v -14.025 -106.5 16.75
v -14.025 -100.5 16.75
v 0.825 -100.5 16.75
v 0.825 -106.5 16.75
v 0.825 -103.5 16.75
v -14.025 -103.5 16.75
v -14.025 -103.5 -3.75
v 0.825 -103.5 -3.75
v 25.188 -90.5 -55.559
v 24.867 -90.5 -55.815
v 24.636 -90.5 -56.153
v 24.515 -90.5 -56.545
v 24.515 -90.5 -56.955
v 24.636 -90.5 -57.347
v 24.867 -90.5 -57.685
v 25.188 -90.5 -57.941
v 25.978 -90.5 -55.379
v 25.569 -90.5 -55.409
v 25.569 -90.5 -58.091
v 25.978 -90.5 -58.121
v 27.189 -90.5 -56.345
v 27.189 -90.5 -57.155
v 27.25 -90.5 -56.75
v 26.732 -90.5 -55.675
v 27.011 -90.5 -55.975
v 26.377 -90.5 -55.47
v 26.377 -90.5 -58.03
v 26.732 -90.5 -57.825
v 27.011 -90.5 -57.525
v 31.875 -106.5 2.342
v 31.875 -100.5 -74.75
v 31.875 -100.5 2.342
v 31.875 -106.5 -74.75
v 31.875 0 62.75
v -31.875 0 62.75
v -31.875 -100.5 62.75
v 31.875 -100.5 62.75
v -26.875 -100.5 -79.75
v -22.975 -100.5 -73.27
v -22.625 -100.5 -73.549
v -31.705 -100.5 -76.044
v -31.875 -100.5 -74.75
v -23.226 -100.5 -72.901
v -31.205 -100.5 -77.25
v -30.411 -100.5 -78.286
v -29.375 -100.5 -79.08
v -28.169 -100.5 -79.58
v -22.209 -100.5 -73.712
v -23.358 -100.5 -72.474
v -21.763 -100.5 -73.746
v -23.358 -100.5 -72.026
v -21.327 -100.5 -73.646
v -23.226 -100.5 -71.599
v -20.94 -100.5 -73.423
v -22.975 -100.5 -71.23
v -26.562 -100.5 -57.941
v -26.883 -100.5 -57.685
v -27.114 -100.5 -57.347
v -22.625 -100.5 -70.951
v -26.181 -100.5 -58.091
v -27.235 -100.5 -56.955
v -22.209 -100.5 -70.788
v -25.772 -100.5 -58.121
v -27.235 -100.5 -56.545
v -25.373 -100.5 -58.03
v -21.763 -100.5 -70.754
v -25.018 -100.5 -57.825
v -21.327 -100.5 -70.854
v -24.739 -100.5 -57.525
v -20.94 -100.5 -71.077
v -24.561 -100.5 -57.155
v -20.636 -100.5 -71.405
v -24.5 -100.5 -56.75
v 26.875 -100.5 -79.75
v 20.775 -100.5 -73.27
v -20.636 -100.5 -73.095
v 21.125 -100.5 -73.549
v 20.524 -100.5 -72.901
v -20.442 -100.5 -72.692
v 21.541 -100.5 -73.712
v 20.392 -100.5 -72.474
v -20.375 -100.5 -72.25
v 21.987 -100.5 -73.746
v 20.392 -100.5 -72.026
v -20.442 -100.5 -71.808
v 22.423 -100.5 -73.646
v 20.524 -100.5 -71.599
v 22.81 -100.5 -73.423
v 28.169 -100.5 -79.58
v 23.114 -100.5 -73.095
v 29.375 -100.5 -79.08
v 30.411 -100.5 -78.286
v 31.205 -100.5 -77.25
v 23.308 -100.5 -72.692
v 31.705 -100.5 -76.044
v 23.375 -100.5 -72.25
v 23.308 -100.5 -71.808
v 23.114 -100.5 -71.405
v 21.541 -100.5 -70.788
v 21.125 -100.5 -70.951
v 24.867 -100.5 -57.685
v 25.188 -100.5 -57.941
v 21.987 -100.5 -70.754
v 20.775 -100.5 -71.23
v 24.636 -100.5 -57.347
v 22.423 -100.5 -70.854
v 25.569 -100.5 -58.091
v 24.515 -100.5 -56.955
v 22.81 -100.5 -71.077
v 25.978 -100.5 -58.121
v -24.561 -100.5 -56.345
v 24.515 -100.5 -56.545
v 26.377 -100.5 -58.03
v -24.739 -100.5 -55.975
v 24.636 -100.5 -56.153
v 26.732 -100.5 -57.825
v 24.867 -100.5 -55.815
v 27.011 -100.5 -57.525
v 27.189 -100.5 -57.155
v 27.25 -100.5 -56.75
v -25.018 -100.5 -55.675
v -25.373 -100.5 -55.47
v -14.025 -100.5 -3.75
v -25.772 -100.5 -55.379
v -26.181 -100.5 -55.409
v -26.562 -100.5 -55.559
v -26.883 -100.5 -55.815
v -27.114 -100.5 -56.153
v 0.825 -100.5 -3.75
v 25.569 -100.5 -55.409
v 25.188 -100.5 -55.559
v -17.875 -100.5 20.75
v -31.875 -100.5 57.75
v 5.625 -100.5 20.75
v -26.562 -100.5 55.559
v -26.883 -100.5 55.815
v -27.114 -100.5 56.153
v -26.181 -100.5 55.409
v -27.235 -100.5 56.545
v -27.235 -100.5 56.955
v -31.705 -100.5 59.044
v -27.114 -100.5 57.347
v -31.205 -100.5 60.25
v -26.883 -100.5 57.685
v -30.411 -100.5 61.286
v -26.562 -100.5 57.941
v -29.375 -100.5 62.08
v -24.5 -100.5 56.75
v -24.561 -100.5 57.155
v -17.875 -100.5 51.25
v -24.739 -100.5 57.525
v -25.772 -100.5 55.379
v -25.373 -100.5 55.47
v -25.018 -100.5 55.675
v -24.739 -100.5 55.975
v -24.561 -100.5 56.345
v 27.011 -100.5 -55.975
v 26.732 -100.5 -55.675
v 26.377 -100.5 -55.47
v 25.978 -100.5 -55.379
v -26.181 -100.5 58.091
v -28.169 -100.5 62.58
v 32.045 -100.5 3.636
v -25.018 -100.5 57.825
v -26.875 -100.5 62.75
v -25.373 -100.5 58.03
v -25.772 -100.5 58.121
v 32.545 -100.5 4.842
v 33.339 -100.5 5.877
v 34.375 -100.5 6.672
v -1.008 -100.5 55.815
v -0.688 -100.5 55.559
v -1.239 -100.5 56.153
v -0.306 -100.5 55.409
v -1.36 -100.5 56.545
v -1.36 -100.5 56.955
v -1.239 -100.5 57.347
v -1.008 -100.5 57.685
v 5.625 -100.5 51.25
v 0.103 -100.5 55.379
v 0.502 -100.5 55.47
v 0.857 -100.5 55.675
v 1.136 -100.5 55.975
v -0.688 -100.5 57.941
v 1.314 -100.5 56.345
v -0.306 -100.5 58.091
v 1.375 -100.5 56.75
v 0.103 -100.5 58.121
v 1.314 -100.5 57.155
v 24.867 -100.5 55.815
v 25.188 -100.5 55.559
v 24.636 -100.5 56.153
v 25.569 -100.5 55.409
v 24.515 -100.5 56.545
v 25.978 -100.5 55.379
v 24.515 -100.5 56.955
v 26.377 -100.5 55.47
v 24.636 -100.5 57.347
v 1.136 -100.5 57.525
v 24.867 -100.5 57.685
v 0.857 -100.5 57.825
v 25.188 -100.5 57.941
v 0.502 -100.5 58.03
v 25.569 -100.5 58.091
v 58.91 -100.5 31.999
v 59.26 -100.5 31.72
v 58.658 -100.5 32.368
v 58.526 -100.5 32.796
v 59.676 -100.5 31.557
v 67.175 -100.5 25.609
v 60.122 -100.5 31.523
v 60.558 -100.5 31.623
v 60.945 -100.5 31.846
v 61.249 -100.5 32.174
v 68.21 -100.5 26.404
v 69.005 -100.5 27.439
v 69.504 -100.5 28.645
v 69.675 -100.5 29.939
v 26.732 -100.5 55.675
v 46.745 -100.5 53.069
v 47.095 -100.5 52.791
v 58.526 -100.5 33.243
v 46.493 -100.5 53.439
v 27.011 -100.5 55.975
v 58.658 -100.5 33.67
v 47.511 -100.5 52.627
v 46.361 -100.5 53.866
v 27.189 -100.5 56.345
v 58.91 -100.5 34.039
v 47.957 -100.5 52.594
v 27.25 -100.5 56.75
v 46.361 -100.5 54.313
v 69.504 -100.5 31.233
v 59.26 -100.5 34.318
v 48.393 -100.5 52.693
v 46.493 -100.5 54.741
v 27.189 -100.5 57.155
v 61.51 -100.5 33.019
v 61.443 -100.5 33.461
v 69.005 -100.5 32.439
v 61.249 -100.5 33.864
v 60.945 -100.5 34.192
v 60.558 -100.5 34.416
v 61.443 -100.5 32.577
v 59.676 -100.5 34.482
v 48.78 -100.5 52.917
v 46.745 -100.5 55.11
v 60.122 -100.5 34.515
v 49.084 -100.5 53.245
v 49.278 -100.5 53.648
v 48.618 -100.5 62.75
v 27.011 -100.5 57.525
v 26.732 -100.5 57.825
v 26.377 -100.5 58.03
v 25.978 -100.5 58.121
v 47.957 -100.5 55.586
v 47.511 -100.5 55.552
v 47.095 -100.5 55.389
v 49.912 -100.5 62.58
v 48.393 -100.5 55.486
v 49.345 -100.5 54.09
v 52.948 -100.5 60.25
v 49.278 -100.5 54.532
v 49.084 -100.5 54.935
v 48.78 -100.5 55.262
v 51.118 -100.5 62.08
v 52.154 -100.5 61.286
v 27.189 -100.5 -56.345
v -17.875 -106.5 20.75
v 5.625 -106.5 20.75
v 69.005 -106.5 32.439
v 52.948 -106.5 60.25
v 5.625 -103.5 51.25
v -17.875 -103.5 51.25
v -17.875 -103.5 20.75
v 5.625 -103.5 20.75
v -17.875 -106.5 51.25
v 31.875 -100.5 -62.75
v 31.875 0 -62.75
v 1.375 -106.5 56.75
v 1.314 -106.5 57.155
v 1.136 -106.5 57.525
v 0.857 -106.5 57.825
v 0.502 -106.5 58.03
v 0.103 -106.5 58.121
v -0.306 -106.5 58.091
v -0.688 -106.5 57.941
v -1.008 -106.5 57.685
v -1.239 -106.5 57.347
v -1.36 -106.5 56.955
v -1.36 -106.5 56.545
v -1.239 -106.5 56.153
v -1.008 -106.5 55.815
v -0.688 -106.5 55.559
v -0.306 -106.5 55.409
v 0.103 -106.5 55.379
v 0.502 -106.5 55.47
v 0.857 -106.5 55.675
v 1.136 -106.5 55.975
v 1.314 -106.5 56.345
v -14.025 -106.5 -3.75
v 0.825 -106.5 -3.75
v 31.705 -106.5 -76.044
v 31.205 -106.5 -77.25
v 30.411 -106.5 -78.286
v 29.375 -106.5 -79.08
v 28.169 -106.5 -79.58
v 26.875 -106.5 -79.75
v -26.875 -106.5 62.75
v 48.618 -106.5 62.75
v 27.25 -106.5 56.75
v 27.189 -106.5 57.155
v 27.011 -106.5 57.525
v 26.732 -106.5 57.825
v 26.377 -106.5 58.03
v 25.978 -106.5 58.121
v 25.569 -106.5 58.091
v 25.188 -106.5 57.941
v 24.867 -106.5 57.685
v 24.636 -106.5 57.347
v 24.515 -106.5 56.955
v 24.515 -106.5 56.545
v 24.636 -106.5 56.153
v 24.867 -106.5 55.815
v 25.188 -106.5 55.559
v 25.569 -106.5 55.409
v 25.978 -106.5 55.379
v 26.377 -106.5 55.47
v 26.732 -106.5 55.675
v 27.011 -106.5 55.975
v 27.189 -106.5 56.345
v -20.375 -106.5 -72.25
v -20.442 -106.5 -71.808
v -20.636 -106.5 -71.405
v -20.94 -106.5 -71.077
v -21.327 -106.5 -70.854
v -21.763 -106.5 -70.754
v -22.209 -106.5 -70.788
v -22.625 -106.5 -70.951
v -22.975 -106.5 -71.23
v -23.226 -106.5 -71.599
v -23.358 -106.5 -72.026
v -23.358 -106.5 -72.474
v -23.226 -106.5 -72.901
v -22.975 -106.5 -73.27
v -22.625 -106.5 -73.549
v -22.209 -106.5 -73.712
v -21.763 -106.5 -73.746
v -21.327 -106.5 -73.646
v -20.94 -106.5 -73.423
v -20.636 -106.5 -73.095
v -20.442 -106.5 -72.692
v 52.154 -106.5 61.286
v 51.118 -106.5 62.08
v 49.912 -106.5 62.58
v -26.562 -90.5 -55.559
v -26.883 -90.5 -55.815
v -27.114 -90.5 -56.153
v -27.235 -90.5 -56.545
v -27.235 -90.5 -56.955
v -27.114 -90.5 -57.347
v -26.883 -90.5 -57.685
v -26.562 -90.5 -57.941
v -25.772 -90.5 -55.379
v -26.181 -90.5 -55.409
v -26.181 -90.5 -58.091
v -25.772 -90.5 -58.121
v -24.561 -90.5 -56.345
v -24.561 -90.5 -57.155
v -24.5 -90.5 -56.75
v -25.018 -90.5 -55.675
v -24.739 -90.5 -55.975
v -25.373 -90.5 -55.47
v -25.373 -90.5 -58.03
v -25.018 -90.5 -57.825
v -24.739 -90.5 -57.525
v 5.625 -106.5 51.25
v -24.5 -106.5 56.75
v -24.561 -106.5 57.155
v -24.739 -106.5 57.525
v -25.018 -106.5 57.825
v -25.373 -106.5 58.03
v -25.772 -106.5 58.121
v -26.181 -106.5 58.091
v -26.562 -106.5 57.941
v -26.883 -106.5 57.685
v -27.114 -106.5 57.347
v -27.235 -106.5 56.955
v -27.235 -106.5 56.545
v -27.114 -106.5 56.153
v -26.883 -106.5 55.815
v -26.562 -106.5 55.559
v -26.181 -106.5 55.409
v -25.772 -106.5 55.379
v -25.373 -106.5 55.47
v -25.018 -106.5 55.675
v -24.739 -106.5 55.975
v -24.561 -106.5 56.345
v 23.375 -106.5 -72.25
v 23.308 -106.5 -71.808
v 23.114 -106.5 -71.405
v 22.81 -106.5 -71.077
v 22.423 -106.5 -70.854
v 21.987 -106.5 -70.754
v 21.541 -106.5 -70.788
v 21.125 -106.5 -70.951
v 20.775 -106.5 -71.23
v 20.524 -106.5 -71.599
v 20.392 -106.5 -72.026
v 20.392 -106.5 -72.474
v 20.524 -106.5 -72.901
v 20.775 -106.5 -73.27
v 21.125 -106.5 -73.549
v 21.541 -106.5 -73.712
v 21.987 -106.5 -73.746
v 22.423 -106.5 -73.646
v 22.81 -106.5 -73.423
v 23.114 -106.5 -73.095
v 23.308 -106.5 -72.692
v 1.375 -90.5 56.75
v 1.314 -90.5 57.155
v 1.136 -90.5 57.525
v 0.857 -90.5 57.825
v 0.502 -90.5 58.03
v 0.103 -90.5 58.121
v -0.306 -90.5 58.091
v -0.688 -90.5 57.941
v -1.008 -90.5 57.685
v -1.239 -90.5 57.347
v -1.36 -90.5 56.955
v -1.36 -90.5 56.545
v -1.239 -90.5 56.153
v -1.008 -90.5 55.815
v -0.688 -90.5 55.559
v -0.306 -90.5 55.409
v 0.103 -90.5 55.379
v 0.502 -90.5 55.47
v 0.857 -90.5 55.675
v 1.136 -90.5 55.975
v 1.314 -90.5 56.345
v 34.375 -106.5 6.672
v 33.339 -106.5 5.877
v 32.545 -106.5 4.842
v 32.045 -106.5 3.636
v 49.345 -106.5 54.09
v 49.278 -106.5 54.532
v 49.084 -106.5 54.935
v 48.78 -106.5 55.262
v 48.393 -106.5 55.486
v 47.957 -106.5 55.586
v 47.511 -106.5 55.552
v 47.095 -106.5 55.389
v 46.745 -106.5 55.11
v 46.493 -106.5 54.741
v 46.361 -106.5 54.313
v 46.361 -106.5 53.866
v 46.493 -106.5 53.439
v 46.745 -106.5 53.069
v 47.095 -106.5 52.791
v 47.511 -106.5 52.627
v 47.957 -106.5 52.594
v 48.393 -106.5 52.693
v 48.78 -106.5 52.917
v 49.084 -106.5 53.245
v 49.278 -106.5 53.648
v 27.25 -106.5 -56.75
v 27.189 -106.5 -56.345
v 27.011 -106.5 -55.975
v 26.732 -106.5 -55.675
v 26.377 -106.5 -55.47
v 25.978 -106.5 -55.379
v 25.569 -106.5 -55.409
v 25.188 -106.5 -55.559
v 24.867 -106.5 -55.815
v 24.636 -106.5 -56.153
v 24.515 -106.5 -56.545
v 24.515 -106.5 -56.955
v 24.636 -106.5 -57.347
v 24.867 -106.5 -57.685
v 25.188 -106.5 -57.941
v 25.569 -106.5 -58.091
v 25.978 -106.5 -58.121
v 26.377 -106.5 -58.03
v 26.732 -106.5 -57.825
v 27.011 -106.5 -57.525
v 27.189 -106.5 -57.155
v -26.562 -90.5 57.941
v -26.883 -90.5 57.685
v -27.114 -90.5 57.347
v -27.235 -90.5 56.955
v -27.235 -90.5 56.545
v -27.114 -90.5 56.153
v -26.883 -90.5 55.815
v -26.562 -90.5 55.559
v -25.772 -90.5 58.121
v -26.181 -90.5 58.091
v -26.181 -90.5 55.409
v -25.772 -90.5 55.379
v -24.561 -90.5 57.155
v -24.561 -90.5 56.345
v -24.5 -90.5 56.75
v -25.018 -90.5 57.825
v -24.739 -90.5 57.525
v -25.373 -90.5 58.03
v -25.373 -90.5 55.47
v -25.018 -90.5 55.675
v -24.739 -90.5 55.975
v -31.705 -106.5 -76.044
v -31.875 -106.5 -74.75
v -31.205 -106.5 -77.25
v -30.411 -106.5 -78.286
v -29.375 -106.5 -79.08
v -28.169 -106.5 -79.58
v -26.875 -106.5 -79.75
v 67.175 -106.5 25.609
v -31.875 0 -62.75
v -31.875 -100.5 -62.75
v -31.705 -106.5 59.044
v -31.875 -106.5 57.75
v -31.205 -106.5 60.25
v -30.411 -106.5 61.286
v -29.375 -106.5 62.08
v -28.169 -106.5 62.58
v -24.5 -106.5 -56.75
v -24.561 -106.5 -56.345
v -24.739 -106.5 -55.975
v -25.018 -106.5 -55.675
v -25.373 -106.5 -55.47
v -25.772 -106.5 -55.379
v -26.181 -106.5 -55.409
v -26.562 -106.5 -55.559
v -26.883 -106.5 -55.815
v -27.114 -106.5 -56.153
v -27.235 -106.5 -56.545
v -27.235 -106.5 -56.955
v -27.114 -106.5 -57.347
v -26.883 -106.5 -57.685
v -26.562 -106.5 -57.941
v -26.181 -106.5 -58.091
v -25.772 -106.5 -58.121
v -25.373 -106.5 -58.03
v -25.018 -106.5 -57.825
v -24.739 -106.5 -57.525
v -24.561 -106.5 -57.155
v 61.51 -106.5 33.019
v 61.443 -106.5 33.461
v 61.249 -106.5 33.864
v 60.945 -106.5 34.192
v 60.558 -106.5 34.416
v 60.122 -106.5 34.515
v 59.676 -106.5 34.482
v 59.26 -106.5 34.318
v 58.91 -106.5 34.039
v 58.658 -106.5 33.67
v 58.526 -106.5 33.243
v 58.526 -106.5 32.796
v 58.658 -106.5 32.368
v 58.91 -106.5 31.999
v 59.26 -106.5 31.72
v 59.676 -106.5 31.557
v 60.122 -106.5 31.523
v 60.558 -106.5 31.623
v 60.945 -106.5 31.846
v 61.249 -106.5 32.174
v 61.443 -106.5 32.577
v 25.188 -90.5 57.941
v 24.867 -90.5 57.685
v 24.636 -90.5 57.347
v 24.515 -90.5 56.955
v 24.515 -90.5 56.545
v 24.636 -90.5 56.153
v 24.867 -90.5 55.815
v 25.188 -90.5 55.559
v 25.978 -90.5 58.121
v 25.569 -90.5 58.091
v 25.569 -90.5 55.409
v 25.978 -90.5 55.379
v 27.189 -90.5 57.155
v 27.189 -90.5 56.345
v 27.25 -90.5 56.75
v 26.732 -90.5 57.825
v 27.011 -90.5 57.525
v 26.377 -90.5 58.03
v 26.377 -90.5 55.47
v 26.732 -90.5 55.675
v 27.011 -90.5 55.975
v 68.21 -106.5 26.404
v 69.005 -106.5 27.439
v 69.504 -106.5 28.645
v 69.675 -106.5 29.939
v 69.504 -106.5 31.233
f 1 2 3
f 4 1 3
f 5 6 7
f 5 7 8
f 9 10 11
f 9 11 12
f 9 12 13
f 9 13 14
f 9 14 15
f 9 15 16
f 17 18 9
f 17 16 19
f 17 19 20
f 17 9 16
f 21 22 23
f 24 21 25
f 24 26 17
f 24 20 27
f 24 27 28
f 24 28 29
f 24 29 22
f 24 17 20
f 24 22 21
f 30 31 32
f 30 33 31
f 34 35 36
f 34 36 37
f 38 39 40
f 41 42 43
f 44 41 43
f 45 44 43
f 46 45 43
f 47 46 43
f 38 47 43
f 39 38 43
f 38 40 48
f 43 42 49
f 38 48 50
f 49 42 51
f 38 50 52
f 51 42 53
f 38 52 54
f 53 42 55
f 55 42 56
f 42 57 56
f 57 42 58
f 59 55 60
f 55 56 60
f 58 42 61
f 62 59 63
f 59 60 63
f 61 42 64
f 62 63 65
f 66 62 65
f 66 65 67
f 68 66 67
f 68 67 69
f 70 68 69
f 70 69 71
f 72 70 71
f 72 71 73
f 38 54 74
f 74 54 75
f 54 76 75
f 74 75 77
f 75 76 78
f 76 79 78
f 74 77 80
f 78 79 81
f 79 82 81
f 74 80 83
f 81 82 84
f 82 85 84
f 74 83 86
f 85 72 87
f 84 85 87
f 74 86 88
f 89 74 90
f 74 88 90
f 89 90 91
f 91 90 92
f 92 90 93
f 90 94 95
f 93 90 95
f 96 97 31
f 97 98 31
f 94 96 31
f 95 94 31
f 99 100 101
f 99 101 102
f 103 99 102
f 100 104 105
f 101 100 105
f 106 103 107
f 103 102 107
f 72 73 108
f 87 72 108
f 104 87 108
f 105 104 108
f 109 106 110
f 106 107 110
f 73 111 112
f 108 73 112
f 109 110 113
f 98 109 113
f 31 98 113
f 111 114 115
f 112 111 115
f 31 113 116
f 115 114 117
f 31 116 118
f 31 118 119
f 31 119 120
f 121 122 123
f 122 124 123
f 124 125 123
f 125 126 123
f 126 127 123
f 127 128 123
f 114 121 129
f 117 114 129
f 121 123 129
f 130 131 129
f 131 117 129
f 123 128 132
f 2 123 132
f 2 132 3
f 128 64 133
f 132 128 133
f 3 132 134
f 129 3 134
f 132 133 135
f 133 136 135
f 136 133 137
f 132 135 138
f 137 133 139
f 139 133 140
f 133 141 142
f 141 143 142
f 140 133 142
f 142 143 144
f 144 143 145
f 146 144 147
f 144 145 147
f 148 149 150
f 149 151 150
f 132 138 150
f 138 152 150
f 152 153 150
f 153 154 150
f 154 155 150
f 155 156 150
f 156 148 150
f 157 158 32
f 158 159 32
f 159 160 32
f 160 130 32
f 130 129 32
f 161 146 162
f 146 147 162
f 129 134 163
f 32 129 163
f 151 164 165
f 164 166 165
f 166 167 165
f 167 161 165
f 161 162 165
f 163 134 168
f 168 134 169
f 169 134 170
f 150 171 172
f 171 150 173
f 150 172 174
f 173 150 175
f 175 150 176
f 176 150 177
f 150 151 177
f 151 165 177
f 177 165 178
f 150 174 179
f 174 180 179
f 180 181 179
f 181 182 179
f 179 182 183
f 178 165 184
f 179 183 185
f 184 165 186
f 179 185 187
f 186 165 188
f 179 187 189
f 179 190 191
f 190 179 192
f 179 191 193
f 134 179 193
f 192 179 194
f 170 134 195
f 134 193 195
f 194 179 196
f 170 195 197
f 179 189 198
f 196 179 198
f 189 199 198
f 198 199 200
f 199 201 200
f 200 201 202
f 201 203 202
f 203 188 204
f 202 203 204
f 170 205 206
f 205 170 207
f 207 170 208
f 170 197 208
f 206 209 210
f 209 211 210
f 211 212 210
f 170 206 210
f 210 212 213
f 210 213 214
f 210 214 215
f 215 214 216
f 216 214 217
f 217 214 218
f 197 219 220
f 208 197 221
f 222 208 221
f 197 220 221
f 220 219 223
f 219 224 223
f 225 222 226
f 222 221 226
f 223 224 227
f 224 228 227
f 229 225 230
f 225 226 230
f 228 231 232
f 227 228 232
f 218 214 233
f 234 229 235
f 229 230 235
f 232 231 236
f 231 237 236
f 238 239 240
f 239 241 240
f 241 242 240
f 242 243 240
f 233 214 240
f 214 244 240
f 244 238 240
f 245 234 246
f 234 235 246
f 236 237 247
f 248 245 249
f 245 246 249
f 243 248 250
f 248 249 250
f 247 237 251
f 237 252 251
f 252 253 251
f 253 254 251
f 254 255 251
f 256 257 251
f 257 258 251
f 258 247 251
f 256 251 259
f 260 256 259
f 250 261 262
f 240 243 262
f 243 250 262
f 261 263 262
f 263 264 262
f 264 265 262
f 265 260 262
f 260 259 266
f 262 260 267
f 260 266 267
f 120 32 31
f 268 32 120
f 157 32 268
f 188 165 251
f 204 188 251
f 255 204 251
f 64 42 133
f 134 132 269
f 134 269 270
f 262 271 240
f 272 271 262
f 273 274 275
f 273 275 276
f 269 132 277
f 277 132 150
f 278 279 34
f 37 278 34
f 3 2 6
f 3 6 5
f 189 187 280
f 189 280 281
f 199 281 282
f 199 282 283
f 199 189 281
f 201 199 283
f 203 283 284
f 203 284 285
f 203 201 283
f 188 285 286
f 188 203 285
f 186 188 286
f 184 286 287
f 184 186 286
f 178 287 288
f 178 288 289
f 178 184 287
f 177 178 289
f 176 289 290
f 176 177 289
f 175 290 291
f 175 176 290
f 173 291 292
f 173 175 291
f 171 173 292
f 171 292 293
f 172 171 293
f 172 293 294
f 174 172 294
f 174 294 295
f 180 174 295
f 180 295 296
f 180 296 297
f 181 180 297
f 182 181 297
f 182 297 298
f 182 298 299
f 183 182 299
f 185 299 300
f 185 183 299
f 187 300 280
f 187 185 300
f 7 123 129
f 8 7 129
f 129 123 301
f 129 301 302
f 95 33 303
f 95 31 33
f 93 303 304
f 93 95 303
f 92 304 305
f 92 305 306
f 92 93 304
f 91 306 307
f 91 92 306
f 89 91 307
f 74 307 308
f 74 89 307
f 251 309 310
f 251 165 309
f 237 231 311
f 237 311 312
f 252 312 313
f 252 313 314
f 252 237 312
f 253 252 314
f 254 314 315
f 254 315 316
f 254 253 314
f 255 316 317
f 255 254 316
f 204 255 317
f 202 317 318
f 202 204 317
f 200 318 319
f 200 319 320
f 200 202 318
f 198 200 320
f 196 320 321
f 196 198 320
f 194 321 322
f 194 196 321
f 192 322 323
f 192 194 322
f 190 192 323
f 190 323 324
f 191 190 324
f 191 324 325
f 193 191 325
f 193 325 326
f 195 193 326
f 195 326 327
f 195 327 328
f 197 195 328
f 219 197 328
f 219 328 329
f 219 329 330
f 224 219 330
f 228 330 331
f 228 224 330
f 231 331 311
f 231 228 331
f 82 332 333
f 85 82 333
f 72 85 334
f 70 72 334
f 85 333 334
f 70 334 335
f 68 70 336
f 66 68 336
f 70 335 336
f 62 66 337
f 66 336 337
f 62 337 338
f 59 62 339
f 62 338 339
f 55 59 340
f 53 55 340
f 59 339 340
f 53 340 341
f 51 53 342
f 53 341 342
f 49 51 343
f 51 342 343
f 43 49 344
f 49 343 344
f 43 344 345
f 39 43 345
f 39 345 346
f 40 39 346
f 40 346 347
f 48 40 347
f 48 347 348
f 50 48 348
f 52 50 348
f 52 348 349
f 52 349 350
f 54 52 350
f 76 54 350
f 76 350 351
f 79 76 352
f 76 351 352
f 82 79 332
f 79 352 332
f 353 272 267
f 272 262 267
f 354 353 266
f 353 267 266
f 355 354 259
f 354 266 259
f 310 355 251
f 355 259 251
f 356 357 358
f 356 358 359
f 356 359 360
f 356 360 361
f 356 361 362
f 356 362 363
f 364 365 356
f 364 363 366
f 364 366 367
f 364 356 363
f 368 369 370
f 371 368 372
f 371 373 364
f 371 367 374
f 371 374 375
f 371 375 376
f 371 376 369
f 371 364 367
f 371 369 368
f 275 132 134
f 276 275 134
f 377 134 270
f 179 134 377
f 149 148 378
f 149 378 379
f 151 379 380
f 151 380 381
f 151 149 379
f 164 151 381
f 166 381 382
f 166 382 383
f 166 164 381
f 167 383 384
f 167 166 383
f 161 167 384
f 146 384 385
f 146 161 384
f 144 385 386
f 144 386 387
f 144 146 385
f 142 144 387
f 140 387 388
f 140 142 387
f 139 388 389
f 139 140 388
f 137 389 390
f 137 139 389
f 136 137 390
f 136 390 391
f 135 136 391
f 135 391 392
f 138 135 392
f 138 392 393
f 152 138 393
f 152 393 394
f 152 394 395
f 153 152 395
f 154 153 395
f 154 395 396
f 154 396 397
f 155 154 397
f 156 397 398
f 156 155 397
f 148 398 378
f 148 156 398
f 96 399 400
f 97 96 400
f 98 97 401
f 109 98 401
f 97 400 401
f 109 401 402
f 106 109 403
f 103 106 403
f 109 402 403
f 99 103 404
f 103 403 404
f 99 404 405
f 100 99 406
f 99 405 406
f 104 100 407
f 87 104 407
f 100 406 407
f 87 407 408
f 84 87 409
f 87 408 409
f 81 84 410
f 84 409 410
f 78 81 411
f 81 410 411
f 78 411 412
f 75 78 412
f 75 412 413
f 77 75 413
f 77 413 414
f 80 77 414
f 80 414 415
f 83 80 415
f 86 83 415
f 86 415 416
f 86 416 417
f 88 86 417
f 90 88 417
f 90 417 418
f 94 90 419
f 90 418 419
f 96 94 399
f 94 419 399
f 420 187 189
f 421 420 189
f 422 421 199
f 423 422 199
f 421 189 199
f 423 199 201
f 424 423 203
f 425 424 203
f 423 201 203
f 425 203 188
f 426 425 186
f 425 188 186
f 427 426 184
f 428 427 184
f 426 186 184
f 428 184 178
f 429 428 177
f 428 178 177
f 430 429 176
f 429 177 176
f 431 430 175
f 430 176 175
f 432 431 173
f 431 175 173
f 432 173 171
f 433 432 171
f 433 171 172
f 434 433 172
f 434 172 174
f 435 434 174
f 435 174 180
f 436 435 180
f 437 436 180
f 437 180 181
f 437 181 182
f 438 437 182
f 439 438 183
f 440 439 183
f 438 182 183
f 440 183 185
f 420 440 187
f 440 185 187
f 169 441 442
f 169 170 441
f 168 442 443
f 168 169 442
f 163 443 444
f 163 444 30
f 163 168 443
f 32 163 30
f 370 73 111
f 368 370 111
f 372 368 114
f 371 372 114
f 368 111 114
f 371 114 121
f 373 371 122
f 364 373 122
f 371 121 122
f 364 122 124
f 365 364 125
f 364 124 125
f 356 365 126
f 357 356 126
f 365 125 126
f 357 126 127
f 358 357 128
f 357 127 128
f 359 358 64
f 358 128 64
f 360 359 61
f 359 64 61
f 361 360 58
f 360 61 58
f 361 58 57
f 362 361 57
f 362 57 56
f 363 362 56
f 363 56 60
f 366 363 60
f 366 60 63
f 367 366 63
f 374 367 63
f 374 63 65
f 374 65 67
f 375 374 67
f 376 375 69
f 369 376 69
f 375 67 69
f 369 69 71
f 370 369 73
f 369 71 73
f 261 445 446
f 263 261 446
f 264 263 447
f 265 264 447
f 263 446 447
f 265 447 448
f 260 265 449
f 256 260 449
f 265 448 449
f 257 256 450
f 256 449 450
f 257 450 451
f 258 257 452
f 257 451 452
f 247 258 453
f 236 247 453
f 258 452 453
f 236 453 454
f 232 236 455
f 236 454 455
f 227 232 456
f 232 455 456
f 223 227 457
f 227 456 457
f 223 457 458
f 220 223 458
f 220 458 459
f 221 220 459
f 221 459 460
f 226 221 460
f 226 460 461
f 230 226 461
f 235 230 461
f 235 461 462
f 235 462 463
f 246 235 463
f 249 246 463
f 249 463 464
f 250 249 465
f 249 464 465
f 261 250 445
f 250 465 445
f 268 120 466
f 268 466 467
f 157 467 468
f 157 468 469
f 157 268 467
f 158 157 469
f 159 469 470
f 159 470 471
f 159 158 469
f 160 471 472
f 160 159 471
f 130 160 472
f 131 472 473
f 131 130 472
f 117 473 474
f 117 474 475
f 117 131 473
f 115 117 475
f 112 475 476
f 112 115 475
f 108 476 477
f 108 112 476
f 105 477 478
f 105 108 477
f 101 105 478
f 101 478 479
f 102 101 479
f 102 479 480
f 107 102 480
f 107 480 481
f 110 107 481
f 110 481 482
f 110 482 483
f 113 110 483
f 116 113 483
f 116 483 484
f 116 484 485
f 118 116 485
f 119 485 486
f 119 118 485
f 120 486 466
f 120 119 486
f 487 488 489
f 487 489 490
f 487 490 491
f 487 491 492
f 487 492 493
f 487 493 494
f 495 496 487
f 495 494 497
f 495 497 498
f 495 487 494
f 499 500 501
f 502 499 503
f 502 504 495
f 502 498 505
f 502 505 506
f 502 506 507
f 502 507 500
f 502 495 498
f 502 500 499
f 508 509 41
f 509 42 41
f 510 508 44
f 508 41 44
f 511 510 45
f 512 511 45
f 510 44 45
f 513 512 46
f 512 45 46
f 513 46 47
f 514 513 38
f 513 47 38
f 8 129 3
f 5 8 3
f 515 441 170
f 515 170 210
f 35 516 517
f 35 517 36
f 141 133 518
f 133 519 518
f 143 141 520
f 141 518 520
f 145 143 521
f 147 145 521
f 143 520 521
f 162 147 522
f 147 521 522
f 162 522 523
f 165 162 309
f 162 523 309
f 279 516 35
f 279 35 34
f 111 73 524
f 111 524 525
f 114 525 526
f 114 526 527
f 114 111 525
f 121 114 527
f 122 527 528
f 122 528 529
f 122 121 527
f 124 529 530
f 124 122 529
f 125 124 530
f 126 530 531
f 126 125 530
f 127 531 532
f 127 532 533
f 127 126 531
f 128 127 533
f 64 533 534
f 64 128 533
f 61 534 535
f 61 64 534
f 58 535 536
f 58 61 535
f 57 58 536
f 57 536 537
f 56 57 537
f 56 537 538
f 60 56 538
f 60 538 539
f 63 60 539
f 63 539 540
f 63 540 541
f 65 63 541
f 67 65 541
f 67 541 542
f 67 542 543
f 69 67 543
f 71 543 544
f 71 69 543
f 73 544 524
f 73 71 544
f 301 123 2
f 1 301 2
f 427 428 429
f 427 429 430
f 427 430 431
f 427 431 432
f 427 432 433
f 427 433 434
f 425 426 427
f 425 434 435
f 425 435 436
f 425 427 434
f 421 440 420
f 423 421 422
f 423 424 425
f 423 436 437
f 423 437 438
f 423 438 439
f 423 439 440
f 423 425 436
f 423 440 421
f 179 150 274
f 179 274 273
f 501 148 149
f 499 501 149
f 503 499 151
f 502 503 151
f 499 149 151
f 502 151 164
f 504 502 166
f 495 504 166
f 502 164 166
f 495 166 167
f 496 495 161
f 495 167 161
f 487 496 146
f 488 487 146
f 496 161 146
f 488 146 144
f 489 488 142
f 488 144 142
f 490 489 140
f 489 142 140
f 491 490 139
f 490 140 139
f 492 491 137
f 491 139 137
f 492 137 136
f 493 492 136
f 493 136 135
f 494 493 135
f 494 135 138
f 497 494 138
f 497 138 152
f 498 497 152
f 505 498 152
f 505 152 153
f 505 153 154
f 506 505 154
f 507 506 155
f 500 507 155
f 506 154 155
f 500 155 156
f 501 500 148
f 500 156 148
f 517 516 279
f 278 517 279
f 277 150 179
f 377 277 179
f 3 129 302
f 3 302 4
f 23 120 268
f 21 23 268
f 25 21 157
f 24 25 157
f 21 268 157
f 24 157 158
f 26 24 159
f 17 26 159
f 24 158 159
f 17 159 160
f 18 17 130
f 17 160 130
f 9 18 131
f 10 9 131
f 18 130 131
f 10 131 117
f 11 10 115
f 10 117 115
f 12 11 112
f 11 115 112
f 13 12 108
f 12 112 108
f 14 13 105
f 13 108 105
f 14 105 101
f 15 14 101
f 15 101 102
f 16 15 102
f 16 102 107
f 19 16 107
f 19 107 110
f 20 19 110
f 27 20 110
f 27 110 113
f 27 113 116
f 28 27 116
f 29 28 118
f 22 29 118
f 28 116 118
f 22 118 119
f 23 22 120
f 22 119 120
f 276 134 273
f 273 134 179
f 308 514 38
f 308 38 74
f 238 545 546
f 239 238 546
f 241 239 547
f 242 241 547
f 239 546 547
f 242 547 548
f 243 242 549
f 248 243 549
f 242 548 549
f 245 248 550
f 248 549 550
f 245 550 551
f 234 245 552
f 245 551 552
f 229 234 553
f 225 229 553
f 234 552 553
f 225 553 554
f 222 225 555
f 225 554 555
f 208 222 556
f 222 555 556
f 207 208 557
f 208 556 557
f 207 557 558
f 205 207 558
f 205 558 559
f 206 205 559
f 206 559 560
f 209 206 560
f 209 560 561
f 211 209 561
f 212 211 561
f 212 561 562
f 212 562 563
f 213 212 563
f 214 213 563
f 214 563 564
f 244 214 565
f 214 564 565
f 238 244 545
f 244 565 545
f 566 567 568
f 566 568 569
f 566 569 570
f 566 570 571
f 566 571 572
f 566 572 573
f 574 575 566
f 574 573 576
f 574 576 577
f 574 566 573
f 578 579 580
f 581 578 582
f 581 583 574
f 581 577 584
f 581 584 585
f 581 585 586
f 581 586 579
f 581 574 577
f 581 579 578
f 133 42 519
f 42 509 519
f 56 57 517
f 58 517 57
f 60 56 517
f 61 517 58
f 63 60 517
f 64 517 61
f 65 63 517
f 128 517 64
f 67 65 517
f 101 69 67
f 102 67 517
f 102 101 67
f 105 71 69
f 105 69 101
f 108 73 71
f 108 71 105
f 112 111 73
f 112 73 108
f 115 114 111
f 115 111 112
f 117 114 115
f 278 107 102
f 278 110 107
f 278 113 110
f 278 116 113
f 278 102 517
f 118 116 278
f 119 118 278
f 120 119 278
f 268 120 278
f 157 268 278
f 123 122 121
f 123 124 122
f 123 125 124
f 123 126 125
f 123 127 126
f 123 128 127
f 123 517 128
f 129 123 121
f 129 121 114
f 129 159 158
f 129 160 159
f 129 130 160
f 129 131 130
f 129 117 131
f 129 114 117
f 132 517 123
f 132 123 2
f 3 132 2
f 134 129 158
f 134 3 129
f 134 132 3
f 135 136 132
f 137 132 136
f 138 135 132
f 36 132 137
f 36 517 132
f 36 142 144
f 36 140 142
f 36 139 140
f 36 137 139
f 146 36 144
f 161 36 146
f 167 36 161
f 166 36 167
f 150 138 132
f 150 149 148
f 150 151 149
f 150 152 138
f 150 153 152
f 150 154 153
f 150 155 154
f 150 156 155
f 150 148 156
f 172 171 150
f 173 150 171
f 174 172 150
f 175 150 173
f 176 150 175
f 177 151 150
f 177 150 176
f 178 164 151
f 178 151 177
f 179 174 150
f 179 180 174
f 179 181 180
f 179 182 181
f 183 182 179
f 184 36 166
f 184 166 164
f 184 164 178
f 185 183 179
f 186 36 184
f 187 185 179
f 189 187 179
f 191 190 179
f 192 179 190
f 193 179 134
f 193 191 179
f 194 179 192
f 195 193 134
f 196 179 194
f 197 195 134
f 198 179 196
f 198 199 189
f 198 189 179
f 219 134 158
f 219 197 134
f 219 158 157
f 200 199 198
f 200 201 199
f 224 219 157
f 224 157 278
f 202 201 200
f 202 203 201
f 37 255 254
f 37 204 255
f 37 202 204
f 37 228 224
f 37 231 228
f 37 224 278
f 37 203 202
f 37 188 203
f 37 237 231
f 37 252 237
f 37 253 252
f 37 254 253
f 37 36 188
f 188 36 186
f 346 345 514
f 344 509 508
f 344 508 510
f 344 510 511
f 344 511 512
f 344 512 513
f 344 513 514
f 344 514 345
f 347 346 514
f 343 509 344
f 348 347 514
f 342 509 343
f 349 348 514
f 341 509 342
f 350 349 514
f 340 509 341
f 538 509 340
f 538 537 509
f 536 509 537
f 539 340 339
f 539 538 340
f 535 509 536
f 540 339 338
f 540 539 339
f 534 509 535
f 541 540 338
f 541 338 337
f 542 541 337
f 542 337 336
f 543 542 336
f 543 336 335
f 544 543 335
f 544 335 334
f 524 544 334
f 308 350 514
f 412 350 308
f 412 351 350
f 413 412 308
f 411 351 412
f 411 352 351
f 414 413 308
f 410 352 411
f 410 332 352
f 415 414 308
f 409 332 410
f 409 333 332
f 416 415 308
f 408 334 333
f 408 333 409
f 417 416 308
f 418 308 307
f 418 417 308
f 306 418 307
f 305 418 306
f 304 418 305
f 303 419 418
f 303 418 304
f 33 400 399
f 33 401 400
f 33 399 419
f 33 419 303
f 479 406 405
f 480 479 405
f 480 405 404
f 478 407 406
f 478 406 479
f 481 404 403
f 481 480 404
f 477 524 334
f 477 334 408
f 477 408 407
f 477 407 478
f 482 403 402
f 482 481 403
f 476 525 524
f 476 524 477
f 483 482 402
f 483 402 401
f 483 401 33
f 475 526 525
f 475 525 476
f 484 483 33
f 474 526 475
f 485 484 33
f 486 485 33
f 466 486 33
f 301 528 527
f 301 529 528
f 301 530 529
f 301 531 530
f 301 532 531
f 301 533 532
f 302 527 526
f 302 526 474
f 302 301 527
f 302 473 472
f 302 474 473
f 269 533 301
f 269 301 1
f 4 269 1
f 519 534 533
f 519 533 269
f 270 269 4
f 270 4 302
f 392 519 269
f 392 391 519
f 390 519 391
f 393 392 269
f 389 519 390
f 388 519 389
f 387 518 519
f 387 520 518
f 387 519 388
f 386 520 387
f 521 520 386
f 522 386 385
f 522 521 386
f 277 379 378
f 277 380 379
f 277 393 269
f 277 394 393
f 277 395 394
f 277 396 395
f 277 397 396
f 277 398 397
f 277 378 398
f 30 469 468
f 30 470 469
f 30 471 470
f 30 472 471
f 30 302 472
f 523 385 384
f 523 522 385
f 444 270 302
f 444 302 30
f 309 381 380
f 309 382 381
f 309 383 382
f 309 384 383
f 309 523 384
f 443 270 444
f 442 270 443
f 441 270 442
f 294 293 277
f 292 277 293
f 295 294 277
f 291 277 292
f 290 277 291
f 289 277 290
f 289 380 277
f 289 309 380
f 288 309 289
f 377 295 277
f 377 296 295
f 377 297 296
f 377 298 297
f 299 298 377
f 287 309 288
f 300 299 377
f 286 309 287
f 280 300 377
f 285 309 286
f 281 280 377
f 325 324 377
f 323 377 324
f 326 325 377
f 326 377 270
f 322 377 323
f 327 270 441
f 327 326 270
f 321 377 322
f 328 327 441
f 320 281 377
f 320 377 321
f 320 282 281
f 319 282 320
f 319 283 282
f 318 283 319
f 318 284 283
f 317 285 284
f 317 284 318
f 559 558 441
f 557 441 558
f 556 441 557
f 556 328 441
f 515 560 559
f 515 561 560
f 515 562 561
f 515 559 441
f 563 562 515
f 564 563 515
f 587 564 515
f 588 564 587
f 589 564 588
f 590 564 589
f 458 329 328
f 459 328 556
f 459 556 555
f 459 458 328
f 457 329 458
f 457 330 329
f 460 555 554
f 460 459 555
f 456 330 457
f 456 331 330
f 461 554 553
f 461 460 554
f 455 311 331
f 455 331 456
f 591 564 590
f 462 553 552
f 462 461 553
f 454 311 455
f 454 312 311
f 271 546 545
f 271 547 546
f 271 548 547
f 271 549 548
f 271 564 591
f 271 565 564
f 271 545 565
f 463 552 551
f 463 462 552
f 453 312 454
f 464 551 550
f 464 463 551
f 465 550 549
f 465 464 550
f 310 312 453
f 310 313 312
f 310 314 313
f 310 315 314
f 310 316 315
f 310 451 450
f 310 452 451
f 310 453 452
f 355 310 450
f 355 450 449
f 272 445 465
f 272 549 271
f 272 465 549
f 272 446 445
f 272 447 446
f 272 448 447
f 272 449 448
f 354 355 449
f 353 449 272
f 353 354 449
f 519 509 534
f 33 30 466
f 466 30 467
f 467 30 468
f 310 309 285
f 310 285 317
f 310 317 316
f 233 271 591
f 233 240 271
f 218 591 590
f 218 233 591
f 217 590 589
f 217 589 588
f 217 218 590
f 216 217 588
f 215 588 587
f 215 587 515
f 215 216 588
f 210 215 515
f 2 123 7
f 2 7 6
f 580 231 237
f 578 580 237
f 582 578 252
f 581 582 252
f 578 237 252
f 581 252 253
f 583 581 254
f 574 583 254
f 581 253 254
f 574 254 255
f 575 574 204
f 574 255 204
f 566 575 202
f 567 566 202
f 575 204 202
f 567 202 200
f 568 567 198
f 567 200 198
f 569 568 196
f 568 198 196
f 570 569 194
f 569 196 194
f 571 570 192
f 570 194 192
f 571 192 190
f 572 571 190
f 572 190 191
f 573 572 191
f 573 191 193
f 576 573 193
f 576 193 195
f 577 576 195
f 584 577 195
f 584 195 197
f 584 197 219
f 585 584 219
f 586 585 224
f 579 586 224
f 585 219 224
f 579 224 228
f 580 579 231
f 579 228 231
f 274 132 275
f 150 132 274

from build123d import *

# Parameters (mm, degrees)
F0_W     = 63.75
F0_H     = 125.5
F1_DEPTH = 100.5
F2_R     = 1.375
F3_DEPTH = 10
F4_W     = 23.5
F4_H     = 30.5
F4_W_2   = 14.85
F4_H_2   = 20.5
F5_DEPTH = 3
F6_DEPTH = 6
F7_W     = 63.75
F7_H     = 17
F7_R     = 1.5
F8_DEPTH = 6
F9_R     = 5


with BuildPart() as f1:
    # F0 (on Front) → F1 (new body)
    with BuildSketch(Plane.XZ):
        Rectangle(F0_W, F0_H)
    extrude(amount=F1_DEPTH)

    # F2 (on face) → F3 (cut)
    with BuildSketch(Plane.XZ.offset(100.5)):
        with Locations((-25.875, 56.75)):
            Circle(F2_R)
        with Locations((0, 56.75)):
            Circle(F2_R)
        with Locations((25.875, 56.75)):
            Circle(F2_R)
        with Locations((25.875, -56.75)):
            Circle(F2_R)
        with Locations((-25.875, -56.75)):
            Circle(F2_R)
    extrude(amount=-F3_DEPTH, mode=Mode.SUBTRACT)

    # F4 (on face) → F5 (join)
    with BuildSketch(Plane.XZ.offset(100.5)):
        with Locations((-6.125, 36)):
            Rectangle(F4_W, F4_H)
        with Locations((-6.6, 6.5)):
            Rectangle(F4_W_2, F4_H_2)
    extrude(amount=F5_DEPTH)


with BuildPart() as f6:
    # F6 (new): a face of the model
    f6_faces = [f1.part.faces().sort_by_distance(p)[0] for p in [
        (0.9207952497, -100.5, -4.0460195944),
    ]]
    extrude(f6_faces, amount=F6_DEPTH)

    # F7 (on face) → F8 (join, through all)
    with BuildSketch(Plane.XZ.offset(106.5)):
        with Locations((0, -71.25)):
            Rectangle(F7_W, F7_H)
        with Locations((-21.875, -72.25)):
            Circle(F7_R, mode=Mode.SUBTRACT)
        with Locations((21.875, -72.25)):
            Circle(F7_R, mode=Mode.SUBTRACT)
        Polygon((51.5049091524, 62.75), (31.875, 62.75), (31.875, 5.2286451315), (71.5049091524, 28.1089838486), align=None)
        with Locations((60.0097186241, 33.0192378865)):
            Circle(F7_R, mode=Mode.SUBTRACT)
        with Locations((47.8446551146, 54.0897459622)):
            Circle(F7_R, mode=Mode.SUBTRACT)
    extrude(amount=-F8_DEPTH)

    # F9
    f9_edges = [f6.edges().sort_by_distance(p)[0] for p in [
        (-31.875, -103.5, 62.75),
        (31.875, -103.5, -79.75),
        (-31.875, -103.5, -79.75),
        (71.504909, -103.5, 28.108984),
        (31.875, -103.5, 5.228645),
        (51.504909, -103.5, 62.75),
    ]]
    fillet(f9_edges, radius=F9_R)


solid = Compound([f1.part, f6.part])
